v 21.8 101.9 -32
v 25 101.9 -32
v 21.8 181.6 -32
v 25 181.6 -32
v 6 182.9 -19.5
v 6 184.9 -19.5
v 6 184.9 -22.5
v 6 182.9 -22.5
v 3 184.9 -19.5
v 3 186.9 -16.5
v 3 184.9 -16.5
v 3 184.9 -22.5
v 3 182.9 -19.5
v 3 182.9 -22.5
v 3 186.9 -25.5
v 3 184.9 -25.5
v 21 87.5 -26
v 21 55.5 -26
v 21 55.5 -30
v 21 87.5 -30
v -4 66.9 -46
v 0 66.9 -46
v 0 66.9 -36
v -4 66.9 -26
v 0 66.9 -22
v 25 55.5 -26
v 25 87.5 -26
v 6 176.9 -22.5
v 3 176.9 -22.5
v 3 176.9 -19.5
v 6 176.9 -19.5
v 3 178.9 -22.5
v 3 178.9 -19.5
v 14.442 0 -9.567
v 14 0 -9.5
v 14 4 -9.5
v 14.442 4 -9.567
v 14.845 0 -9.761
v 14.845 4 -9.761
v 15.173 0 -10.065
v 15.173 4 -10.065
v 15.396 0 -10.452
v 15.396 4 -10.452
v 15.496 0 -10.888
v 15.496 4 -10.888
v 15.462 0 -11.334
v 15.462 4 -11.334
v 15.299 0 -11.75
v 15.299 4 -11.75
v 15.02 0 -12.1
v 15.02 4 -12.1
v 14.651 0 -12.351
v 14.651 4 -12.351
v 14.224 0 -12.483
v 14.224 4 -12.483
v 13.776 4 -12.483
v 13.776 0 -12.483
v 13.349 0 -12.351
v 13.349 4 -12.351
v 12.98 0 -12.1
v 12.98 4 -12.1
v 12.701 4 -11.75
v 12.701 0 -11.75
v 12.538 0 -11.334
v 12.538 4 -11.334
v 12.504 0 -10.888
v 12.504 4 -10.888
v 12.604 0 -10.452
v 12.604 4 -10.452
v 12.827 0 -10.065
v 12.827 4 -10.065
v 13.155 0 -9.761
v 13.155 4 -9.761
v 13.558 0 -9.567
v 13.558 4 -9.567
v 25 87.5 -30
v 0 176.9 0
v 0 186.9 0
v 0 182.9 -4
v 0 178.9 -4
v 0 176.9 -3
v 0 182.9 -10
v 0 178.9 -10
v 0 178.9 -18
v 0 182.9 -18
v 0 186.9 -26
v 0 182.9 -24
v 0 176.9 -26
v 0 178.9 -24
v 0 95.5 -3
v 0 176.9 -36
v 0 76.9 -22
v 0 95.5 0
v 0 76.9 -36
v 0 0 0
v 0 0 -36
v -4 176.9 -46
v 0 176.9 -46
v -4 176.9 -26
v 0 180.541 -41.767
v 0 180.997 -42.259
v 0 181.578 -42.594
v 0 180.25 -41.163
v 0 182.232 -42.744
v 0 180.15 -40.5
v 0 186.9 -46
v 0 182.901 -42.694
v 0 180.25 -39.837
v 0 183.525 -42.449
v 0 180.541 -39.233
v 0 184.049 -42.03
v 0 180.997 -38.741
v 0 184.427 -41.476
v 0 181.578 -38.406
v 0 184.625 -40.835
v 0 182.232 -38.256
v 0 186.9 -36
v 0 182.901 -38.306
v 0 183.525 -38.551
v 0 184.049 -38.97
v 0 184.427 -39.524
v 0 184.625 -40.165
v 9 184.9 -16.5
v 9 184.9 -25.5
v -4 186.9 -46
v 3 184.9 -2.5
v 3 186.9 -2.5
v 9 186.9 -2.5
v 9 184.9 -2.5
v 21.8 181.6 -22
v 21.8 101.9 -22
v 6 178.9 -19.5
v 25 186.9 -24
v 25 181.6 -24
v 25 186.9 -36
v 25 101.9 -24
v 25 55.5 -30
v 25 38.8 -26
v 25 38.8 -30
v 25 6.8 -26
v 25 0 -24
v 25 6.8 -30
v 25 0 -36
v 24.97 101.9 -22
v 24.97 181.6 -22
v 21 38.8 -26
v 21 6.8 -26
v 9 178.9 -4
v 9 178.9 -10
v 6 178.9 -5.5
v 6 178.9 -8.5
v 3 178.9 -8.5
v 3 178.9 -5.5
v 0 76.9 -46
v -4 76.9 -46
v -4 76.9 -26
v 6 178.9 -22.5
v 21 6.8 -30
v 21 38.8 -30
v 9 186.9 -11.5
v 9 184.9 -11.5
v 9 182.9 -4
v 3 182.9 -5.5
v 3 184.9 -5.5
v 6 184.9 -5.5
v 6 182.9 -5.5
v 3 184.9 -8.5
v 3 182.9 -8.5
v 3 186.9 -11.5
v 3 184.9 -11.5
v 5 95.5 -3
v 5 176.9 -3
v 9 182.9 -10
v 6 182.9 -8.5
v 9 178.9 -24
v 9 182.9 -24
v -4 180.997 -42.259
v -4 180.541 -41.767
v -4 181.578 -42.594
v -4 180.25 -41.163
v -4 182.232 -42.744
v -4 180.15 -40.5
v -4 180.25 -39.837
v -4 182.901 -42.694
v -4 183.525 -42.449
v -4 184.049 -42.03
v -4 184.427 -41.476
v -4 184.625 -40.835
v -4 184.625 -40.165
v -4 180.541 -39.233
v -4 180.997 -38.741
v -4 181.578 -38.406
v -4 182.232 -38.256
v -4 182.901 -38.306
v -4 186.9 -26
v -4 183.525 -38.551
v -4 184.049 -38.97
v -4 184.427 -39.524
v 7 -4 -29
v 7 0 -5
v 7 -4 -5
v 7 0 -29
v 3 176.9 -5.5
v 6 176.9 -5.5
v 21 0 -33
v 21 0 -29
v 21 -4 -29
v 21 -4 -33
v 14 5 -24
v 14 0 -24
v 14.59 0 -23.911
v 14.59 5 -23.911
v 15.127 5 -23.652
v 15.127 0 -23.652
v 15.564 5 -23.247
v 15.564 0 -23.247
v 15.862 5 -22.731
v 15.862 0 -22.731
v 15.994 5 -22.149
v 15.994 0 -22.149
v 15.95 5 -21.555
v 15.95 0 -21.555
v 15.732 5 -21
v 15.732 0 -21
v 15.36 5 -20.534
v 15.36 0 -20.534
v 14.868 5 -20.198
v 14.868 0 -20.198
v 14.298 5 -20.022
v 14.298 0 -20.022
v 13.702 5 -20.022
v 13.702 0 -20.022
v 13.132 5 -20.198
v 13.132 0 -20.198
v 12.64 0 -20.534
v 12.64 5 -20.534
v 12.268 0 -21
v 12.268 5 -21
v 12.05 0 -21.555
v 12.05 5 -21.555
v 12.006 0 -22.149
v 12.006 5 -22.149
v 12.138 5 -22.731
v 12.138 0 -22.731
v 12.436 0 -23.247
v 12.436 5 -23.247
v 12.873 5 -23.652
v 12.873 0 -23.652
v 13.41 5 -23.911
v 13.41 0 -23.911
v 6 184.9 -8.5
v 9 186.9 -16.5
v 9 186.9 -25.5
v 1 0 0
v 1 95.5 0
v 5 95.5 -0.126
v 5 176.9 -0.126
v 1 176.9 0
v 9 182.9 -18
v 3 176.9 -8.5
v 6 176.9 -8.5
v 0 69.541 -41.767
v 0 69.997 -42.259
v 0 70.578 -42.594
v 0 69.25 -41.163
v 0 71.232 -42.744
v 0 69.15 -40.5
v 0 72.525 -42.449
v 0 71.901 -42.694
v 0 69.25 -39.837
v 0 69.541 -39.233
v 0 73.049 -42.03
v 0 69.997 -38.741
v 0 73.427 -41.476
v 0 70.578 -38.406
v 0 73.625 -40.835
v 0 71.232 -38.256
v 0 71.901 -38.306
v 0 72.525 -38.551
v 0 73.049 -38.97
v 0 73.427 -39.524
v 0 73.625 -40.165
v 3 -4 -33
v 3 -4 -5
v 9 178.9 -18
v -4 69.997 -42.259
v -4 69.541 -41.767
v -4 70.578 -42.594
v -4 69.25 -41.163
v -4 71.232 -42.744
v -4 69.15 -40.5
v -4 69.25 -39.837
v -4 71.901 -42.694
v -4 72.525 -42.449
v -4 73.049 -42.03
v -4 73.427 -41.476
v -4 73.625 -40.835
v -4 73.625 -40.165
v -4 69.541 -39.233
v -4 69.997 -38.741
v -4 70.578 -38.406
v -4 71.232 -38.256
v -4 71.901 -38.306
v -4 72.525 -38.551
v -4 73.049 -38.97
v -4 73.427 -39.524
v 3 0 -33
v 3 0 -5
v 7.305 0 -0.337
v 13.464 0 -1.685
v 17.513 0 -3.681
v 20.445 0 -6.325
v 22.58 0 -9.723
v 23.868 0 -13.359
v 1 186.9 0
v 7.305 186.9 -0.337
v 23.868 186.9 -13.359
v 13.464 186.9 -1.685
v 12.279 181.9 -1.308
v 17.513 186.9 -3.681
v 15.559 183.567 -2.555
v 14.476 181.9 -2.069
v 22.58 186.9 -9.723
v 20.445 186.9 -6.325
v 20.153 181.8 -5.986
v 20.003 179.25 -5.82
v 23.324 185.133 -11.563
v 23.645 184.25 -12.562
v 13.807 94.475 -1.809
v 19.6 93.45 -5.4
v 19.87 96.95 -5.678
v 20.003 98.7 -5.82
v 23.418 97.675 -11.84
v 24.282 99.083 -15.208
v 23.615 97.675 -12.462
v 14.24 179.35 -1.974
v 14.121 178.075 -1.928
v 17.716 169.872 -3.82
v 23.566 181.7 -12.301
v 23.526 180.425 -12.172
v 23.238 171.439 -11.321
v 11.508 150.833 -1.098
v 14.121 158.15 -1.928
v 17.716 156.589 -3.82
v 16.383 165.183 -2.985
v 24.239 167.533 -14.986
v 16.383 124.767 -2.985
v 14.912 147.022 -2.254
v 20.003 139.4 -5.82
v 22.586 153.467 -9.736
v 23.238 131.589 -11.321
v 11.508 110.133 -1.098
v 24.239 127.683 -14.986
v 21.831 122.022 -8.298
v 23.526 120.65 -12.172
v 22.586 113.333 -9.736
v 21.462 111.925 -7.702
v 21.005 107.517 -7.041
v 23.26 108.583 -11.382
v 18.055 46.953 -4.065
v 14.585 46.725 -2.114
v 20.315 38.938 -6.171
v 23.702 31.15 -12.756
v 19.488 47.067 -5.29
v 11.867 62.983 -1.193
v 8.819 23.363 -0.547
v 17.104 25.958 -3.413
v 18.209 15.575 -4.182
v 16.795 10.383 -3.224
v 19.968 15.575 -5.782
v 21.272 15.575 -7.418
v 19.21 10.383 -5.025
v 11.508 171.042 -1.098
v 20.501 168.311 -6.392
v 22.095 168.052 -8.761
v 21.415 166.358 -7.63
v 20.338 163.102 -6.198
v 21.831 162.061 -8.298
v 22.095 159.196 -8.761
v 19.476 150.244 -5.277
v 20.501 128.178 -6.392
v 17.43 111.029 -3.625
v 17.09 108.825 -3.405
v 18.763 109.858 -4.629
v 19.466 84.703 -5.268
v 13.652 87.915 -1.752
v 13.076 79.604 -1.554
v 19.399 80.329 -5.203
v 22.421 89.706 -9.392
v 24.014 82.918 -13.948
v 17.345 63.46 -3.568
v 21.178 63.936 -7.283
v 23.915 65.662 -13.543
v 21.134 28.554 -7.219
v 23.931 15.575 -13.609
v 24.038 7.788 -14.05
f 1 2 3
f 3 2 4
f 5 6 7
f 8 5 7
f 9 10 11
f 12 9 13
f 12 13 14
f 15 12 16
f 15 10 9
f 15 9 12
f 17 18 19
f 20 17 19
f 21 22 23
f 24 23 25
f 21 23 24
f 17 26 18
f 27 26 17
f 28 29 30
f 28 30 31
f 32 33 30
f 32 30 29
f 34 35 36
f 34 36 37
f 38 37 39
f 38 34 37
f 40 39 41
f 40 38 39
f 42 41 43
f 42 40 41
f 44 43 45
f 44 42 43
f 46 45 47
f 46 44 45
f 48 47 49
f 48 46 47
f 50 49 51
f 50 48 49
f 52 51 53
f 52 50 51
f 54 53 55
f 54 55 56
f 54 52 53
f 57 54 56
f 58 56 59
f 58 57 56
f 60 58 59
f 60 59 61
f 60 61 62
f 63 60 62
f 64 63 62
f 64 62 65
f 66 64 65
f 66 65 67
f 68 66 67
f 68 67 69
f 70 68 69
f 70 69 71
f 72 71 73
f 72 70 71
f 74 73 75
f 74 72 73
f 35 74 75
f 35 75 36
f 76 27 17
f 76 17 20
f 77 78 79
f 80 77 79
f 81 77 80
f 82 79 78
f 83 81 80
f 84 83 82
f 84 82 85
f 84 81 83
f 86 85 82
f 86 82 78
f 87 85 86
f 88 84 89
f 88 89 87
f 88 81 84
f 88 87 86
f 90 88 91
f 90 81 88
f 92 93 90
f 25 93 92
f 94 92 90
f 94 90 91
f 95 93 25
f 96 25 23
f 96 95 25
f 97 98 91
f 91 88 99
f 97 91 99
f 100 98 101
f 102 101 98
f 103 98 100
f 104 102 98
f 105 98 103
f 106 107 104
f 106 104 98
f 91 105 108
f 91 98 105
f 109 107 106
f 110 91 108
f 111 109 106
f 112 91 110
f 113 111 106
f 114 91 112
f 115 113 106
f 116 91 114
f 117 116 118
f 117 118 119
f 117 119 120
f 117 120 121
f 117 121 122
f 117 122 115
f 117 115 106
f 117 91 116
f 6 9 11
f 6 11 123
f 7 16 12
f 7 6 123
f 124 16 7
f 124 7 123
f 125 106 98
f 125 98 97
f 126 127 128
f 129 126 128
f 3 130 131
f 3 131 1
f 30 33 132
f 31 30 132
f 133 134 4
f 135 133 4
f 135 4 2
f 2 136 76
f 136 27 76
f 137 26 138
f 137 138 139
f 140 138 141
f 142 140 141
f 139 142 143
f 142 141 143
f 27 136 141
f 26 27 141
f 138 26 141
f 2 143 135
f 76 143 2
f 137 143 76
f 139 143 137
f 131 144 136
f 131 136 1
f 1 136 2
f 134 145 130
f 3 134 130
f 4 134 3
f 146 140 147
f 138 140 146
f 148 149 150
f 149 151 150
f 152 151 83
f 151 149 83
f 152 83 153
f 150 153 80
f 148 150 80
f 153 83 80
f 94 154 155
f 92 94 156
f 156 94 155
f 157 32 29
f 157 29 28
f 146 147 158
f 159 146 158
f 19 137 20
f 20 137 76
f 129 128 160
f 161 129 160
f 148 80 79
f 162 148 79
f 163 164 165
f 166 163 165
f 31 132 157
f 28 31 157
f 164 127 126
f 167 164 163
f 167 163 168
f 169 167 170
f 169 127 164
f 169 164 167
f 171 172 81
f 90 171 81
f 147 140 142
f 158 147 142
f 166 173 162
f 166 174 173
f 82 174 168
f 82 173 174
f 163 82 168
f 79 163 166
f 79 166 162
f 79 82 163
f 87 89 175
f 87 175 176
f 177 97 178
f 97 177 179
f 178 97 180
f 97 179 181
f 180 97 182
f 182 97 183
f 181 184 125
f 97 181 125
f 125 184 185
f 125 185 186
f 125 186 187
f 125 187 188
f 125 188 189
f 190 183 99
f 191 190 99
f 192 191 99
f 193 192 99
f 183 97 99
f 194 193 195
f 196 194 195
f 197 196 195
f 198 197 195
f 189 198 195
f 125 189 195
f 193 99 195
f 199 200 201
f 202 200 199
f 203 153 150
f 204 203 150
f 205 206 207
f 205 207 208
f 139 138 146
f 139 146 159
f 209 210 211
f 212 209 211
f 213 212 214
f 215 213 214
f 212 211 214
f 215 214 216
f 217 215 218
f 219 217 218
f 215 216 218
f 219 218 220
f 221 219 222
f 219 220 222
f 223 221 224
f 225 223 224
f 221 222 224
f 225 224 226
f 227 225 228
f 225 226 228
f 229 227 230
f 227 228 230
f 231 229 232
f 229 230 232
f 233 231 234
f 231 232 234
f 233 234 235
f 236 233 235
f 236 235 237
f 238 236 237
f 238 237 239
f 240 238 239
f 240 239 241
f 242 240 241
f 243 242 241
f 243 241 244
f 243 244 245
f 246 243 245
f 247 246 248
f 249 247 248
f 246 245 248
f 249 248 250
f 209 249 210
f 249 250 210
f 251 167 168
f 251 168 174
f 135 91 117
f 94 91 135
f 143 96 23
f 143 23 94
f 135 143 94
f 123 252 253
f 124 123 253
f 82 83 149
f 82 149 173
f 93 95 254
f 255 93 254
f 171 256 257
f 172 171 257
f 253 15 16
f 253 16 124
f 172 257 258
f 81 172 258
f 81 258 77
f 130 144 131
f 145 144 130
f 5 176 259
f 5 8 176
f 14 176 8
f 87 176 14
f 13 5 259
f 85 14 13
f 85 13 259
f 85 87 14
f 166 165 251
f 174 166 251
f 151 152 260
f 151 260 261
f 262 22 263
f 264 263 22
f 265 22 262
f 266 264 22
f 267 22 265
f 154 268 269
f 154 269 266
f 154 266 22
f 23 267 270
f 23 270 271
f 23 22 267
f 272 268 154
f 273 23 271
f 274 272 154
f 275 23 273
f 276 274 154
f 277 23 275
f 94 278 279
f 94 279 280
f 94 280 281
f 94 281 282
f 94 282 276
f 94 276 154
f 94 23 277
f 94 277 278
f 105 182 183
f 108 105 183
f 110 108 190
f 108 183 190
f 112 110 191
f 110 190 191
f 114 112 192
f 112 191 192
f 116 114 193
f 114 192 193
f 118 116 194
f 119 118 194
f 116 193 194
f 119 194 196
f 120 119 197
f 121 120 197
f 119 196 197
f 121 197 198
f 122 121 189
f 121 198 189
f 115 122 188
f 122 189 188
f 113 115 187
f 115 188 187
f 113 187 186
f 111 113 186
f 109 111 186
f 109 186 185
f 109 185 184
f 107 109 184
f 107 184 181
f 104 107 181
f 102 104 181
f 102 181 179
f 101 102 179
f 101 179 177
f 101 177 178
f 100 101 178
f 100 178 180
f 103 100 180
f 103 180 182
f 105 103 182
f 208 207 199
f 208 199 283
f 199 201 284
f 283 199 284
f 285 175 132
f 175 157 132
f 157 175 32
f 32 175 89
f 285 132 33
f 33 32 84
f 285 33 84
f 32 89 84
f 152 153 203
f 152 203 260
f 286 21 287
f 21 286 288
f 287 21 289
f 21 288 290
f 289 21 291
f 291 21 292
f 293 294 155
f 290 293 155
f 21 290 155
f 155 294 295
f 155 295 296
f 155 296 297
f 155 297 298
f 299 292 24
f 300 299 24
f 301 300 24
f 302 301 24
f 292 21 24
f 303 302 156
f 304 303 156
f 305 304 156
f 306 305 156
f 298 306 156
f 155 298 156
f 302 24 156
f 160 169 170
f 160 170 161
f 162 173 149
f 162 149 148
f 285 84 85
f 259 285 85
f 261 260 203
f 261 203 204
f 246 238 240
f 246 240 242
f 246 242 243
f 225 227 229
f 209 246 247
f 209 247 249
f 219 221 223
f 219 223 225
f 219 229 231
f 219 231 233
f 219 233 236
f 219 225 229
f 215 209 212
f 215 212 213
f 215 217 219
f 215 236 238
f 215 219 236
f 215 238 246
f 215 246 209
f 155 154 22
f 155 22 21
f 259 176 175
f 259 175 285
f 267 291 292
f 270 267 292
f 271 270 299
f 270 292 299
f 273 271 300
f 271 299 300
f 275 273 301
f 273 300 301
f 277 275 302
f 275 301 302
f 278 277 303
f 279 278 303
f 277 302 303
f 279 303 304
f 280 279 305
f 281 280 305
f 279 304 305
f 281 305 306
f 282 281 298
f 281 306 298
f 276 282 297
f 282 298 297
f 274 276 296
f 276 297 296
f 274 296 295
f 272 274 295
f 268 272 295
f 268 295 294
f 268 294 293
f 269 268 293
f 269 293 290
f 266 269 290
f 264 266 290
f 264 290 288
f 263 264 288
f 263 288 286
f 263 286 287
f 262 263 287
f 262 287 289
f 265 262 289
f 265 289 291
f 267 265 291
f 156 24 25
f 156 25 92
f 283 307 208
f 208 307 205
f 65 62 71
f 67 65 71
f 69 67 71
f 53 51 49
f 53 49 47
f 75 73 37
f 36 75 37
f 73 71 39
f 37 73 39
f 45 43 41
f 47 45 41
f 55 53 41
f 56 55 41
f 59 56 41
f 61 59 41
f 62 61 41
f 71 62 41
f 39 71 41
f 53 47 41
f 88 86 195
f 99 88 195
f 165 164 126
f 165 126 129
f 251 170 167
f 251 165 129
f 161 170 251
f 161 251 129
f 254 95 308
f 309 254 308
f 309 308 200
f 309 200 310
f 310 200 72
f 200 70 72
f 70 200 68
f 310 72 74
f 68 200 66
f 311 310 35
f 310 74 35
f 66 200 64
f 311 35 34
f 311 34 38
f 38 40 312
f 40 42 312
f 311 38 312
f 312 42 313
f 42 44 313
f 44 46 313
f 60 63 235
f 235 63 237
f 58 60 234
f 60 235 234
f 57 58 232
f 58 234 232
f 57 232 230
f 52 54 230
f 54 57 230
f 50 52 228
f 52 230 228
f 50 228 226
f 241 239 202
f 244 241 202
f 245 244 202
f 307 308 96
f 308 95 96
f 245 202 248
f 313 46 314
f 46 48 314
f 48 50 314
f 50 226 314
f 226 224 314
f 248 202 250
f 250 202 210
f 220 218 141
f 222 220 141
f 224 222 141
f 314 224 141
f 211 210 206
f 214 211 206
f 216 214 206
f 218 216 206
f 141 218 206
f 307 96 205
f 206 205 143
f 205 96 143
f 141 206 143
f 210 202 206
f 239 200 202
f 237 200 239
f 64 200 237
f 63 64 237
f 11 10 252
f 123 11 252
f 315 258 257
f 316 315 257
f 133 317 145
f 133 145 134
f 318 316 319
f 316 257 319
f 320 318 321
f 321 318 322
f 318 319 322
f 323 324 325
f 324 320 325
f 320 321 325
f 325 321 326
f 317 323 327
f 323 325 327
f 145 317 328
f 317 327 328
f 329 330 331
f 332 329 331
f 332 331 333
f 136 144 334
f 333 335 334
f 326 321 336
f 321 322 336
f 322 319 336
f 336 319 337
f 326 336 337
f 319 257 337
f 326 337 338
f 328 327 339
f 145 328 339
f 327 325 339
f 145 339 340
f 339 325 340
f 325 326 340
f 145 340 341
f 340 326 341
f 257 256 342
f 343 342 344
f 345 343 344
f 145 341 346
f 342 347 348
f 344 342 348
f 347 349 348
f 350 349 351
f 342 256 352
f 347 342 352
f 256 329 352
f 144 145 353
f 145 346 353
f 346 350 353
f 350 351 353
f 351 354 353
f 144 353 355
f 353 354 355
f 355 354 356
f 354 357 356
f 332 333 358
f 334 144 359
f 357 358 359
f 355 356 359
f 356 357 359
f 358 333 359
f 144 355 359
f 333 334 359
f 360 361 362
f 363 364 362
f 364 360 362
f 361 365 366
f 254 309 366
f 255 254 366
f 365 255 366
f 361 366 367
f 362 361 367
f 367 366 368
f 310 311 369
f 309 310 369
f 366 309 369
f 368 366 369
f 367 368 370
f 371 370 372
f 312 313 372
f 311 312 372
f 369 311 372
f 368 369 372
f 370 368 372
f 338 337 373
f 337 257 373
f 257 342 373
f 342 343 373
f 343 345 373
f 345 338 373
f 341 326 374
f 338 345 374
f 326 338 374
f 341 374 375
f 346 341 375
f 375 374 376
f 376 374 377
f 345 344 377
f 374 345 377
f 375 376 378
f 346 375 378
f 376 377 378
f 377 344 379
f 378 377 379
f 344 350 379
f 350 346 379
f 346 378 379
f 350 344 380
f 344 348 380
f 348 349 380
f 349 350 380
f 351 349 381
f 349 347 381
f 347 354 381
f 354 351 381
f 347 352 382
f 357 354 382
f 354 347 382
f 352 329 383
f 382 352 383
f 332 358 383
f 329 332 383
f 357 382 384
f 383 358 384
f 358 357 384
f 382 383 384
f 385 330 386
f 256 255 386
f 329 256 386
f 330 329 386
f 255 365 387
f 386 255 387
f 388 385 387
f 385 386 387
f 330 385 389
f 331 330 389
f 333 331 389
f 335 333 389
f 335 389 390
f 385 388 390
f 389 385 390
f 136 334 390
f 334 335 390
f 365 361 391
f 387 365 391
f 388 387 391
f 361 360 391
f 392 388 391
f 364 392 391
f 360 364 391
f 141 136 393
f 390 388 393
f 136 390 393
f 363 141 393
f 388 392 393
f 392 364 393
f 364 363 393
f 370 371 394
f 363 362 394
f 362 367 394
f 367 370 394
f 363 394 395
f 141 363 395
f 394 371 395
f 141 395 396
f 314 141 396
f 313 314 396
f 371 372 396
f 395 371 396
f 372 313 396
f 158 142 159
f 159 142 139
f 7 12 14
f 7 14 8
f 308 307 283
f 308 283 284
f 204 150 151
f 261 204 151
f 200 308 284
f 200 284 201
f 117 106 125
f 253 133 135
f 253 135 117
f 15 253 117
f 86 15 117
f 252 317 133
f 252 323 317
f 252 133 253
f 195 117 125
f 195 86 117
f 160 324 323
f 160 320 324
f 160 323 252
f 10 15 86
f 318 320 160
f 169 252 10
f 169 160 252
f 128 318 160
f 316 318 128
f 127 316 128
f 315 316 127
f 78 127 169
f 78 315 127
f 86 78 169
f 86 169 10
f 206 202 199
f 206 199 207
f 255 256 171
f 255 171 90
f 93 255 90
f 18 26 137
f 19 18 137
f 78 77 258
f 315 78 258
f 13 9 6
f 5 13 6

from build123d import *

# Parameters (mm, degrees)
SKETCH1_W                = 25
SKETCH1_H                = 36
BOSS_EXTRUDE1_DEPTH      = 186.9
FILLET1_SIZE             = 24
SKETCH2_W                = 5
SKETCH2_H                = 81.4
CUT_EXTRUDE1_DEPTH       = 3
BOSS_EXTRUDE3_DEPTH      = 10
BOSS_EXTRUDE3_DEPTH_BACK = 10
SKETCH6_W                = 4
SKETCH6_H                = 10
CUT_EXTRUDE2_REACH       = 196.65
SKETCH7_R                = 2.25
CHAMFER1_SIZE            = 4
SKETCH8_W                = 6
SKETCH8_H                = 4
CUT_EXTRUDE3_DEPTH       = 9
SKETCH9_W                = 3
SKETCH9_H                = 3
CUT_EXTRUDE4_DEPTH       = 10
BOSS_EXTRUDE4_DEPTH      = 4
SKETCH11_R               = 2
CUT_EXTRUDE5_DEPTH       = 5
SKETCH14_R               = 1.5
CUT_EXTRUDE6_DEPTH       = 4
SKETCH15_W               = 4
SKETCH15_H               = 32
CUT_EXTRUDE7_DEPTH       = 4
SKETCH16_W               = 10
SKETCH16_H               = 79.7
CUT_EXTRUDE8_DEPTH       = 3.2
SKETCH17_W               = 6
SKETCH17_H               = 9
CUT_EXTRUDE9_DEPTH       = 2


# Some blends are built 0.0001 mm under size
with BuildPart() as part:
    # Sketch1 → Boss-Extrude1 (new body)
    with BuildSketch(Plane(origin=(0, 0, 0), x_dir=(1, 0, 0), z_dir=(0, 1, 0))):
        with Locations((12.5, 18)):
            Rectangle(SKETCH1_W, SKETCH1_H)
    extrude(amount=BOSS_EXTRUDE1_DEPTH)

    # Fillet1
    # a fillet whose section is not a circle: 24 mm, written as the material it takes off along each edge
    with BuildSketch(Plane(origin=(25, -60, 0), x_dir=(-1, 0, 0), z_dir=(0, 1, 0))) as fillet1_piece_1:
        with BuildLine():
            Bezier((FILLET1_SIZE, 0), (0, 0), (0, -FILLET1_SIZE), weights=[1, 1.222222222, 1])
            Line((0, -FILLET1_SIZE), (0, 0))
            Line((0, 0), (FILLET1_SIZE, 0))
        make_face()
    extrude(amount=306.9, mode=Mode.SUBTRACT)

    # Sketch2 → Cut-Extrude1 (cut)
    with BuildSketch(Plane(origin=(0, 0, 0), x_dir=(-1, 0, 0), z_dir=(0, 0, -1))):
        with Locations((-2.5, 136.2)):
            Rectangle(SKETCH2_W, SKETCH2_H)
    extrude(amount=CUT_EXTRUDE1_DEPTH, mode=Mode.SUBTRACT)

    # Sketch6 → Boss-Extrude3 (add, two sides: drawn at the far end of the back side and taken through both)
    with BuildSketch(Plane(origin=(0, 0, -36), x_dir=(-1, 0, 0), z_dir=(0, 0, -1)).offset(-BOSS_EXTRUDE3_DEPTH_BACK)):
        with Locations((2, 181.9)):
            Rectangle(SKETCH6_W, SKETCH6_H)
        with Locations((2, 71.9)):
            Rectangle(SKETCH6_W, SKETCH6_H)
    extrude(amount=BOSS_EXTRUDE3_DEPTH + BOSS_EXTRUDE3_DEPTH_BACK)

    # Sketch7 → Cut-Extrude2 (cut, up to next)
    with BuildSketch(Plane.ZY.offset(4), mode=Mode.PRIVATE) as cut_extrude2_sk1:
        with Locations(Location((-40.5, 182.4, 0), (0, 0, 270))):
            Circle(SKETCH7_R)
    cut_extrude2_tool1 = extrude(cut_extrude2_sk1.sketch, amount=-CUT_EXTRUDE2_REACH, mode=Mode.PRIVATE) & part.part
    # Sketch7 → Cut-Extrude2 (cut, up to next)
    with BuildSketch(Plane.ZY.offset(4), mode=Mode.PRIVATE) as cut_extrude2_sk2:
        with Locations(Location((-40.5, 71.4, 0), (0, 0, 270))):
            Circle(SKETCH7_R)
    cut_extrude2_tool2 = extrude(cut_extrude2_sk2.sketch, amount=-CUT_EXTRUDE2_REACH, mode=Mode.PRIVATE) & part.part
    add(cut_extrude2_tool1.solids().sort_by_distance((-4, 182.4, -40.5))[0], mode=Mode.SUBTRACT)
    add(cut_extrude2_tool2.solids().sort_by_distance((-4, 71.4, -40.5))[0], mode=Mode.SUBTRACT)

    # Chamfer1
    chamfer1_edges = [part.edges().sort_by_distance(p)[0] for p in [
        (0, 71.9, -26),
    ]]
    chamfer(chamfer1_edges, length=CHAMFER1_SIZE - 0.0001)  # a hair under: the kernel refuses the full size

    # Sketch8 → Cut-Extrude3 (cut)
    with BuildSketch(Plane.ZY):
        with Locations((-7, 180.9)):
            Rectangle(SKETCH8_W, SKETCH8_H)
        with Locations((-21, 180.9)):
            Rectangle(SKETCH8_W, SKETCH8_H)
    extrude(amount=-CUT_EXTRUDE3_DEPTH, mode=Mode.SUBTRACT)

    # Sketch9 → Cut-Extrude4 (cut)
    with BuildSketch(Plane(origin=(0, 186.9, 0), x_dir=(1, 0, 0), z_dir=(0, 1, 0))):
        with Locations((4.5, 7)):
            Rectangle(SKETCH9_W, SKETCH9_H)
        with Locations((4.5, 21)):
            Rectangle(SKETCH9_W, SKETCH9_H)
    extrude(amount=-CUT_EXTRUDE4_DEPTH, mode=Mode.SUBTRACT)

    # Sketch10 → Boss-Extrude4 (add)
    with BuildSketch(Plane.XZ):
        Polygon((3, -5), (7, -5), (7, -29), (21, -29), (21, -33), (7, -33), (3, -33), align=None)
    extrude(amount=BOSS_EXTRUDE4_DEPTH)

    # Sketch11 → Cut-Extrude5 (cut)
    with BuildSketch(Plane.XZ):
        with Locations(Location((14, -22, 0), (0, 0, 270))):
            Circle(SKETCH11_R)
    extrude(amount=-CUT_EXTRUDE5_DEPTH, mode=Mode.SUBTRACT)

    # Sketch14 → Cut-Extrude6 (cut)
    with BuildSketch(Plane(origin=(0, 0, 0), x_dir=(-1, 0, 0), z_dir=(0, 1, 0))):
        with Locations(Location((-14, -11, 0), (0, 0, 90))):
            Circle(SKETCH14_R)
    extrude(amount=CUT_EXTRUDE6_DEPTH, mode=Mode.SUBTRACT)

    # Sketch15 → Cut-Extrude7 (cut)
    with BuildSketch(Plane(origin=(25, 0, 0), x_dir=(0, 0, -1), z_dir=(1, 0, 0))):
        with Locations((28, 71.5)):
            Rectangle(SKETCH15_W, SKETCH15_H)
        with Locations((28, 22.8)):
            Rectangle(SKETCH15_W, SKETCH15_H)
    extrude(amount=-CUT_EXTRUDE7_DEPTH, mode=Mode.SUBTRACT)

    # Sketch16 → Cut-Extrude8 (cut)
    with BuildSketch(Plane(origin=(25, 0, 0), x_dir=(0, 0, -1), z_dir=(1, 0, 0))):
        with Locations((27, 141.75)):
            Rectangle(SKETCH16_W, SKETCH16_H)
    extrude(amount=-CUT_EXTRUDE8_DEPTH, mode=Mode.SUBTRACT)

    # Sketch17 → Cut-Extrude9 (cut)
    with BuildSketch(Plane(origin=(0, 186.9, 0), x_dir=(1, 0, 0), z_dir=(0, 1, 0))):
        with Locations((6, 21)):
            Rectangle(SKETCH17_W, SKETCH17_H)
        with Locations((6, 7)):
            Rectangle(SKETCH17_W, SKETCH17_H)
    extrude(amount=-CUT_EXTRUDE9_DEPTH, mode=Mode.SUBTRACT)


solid = part.part
